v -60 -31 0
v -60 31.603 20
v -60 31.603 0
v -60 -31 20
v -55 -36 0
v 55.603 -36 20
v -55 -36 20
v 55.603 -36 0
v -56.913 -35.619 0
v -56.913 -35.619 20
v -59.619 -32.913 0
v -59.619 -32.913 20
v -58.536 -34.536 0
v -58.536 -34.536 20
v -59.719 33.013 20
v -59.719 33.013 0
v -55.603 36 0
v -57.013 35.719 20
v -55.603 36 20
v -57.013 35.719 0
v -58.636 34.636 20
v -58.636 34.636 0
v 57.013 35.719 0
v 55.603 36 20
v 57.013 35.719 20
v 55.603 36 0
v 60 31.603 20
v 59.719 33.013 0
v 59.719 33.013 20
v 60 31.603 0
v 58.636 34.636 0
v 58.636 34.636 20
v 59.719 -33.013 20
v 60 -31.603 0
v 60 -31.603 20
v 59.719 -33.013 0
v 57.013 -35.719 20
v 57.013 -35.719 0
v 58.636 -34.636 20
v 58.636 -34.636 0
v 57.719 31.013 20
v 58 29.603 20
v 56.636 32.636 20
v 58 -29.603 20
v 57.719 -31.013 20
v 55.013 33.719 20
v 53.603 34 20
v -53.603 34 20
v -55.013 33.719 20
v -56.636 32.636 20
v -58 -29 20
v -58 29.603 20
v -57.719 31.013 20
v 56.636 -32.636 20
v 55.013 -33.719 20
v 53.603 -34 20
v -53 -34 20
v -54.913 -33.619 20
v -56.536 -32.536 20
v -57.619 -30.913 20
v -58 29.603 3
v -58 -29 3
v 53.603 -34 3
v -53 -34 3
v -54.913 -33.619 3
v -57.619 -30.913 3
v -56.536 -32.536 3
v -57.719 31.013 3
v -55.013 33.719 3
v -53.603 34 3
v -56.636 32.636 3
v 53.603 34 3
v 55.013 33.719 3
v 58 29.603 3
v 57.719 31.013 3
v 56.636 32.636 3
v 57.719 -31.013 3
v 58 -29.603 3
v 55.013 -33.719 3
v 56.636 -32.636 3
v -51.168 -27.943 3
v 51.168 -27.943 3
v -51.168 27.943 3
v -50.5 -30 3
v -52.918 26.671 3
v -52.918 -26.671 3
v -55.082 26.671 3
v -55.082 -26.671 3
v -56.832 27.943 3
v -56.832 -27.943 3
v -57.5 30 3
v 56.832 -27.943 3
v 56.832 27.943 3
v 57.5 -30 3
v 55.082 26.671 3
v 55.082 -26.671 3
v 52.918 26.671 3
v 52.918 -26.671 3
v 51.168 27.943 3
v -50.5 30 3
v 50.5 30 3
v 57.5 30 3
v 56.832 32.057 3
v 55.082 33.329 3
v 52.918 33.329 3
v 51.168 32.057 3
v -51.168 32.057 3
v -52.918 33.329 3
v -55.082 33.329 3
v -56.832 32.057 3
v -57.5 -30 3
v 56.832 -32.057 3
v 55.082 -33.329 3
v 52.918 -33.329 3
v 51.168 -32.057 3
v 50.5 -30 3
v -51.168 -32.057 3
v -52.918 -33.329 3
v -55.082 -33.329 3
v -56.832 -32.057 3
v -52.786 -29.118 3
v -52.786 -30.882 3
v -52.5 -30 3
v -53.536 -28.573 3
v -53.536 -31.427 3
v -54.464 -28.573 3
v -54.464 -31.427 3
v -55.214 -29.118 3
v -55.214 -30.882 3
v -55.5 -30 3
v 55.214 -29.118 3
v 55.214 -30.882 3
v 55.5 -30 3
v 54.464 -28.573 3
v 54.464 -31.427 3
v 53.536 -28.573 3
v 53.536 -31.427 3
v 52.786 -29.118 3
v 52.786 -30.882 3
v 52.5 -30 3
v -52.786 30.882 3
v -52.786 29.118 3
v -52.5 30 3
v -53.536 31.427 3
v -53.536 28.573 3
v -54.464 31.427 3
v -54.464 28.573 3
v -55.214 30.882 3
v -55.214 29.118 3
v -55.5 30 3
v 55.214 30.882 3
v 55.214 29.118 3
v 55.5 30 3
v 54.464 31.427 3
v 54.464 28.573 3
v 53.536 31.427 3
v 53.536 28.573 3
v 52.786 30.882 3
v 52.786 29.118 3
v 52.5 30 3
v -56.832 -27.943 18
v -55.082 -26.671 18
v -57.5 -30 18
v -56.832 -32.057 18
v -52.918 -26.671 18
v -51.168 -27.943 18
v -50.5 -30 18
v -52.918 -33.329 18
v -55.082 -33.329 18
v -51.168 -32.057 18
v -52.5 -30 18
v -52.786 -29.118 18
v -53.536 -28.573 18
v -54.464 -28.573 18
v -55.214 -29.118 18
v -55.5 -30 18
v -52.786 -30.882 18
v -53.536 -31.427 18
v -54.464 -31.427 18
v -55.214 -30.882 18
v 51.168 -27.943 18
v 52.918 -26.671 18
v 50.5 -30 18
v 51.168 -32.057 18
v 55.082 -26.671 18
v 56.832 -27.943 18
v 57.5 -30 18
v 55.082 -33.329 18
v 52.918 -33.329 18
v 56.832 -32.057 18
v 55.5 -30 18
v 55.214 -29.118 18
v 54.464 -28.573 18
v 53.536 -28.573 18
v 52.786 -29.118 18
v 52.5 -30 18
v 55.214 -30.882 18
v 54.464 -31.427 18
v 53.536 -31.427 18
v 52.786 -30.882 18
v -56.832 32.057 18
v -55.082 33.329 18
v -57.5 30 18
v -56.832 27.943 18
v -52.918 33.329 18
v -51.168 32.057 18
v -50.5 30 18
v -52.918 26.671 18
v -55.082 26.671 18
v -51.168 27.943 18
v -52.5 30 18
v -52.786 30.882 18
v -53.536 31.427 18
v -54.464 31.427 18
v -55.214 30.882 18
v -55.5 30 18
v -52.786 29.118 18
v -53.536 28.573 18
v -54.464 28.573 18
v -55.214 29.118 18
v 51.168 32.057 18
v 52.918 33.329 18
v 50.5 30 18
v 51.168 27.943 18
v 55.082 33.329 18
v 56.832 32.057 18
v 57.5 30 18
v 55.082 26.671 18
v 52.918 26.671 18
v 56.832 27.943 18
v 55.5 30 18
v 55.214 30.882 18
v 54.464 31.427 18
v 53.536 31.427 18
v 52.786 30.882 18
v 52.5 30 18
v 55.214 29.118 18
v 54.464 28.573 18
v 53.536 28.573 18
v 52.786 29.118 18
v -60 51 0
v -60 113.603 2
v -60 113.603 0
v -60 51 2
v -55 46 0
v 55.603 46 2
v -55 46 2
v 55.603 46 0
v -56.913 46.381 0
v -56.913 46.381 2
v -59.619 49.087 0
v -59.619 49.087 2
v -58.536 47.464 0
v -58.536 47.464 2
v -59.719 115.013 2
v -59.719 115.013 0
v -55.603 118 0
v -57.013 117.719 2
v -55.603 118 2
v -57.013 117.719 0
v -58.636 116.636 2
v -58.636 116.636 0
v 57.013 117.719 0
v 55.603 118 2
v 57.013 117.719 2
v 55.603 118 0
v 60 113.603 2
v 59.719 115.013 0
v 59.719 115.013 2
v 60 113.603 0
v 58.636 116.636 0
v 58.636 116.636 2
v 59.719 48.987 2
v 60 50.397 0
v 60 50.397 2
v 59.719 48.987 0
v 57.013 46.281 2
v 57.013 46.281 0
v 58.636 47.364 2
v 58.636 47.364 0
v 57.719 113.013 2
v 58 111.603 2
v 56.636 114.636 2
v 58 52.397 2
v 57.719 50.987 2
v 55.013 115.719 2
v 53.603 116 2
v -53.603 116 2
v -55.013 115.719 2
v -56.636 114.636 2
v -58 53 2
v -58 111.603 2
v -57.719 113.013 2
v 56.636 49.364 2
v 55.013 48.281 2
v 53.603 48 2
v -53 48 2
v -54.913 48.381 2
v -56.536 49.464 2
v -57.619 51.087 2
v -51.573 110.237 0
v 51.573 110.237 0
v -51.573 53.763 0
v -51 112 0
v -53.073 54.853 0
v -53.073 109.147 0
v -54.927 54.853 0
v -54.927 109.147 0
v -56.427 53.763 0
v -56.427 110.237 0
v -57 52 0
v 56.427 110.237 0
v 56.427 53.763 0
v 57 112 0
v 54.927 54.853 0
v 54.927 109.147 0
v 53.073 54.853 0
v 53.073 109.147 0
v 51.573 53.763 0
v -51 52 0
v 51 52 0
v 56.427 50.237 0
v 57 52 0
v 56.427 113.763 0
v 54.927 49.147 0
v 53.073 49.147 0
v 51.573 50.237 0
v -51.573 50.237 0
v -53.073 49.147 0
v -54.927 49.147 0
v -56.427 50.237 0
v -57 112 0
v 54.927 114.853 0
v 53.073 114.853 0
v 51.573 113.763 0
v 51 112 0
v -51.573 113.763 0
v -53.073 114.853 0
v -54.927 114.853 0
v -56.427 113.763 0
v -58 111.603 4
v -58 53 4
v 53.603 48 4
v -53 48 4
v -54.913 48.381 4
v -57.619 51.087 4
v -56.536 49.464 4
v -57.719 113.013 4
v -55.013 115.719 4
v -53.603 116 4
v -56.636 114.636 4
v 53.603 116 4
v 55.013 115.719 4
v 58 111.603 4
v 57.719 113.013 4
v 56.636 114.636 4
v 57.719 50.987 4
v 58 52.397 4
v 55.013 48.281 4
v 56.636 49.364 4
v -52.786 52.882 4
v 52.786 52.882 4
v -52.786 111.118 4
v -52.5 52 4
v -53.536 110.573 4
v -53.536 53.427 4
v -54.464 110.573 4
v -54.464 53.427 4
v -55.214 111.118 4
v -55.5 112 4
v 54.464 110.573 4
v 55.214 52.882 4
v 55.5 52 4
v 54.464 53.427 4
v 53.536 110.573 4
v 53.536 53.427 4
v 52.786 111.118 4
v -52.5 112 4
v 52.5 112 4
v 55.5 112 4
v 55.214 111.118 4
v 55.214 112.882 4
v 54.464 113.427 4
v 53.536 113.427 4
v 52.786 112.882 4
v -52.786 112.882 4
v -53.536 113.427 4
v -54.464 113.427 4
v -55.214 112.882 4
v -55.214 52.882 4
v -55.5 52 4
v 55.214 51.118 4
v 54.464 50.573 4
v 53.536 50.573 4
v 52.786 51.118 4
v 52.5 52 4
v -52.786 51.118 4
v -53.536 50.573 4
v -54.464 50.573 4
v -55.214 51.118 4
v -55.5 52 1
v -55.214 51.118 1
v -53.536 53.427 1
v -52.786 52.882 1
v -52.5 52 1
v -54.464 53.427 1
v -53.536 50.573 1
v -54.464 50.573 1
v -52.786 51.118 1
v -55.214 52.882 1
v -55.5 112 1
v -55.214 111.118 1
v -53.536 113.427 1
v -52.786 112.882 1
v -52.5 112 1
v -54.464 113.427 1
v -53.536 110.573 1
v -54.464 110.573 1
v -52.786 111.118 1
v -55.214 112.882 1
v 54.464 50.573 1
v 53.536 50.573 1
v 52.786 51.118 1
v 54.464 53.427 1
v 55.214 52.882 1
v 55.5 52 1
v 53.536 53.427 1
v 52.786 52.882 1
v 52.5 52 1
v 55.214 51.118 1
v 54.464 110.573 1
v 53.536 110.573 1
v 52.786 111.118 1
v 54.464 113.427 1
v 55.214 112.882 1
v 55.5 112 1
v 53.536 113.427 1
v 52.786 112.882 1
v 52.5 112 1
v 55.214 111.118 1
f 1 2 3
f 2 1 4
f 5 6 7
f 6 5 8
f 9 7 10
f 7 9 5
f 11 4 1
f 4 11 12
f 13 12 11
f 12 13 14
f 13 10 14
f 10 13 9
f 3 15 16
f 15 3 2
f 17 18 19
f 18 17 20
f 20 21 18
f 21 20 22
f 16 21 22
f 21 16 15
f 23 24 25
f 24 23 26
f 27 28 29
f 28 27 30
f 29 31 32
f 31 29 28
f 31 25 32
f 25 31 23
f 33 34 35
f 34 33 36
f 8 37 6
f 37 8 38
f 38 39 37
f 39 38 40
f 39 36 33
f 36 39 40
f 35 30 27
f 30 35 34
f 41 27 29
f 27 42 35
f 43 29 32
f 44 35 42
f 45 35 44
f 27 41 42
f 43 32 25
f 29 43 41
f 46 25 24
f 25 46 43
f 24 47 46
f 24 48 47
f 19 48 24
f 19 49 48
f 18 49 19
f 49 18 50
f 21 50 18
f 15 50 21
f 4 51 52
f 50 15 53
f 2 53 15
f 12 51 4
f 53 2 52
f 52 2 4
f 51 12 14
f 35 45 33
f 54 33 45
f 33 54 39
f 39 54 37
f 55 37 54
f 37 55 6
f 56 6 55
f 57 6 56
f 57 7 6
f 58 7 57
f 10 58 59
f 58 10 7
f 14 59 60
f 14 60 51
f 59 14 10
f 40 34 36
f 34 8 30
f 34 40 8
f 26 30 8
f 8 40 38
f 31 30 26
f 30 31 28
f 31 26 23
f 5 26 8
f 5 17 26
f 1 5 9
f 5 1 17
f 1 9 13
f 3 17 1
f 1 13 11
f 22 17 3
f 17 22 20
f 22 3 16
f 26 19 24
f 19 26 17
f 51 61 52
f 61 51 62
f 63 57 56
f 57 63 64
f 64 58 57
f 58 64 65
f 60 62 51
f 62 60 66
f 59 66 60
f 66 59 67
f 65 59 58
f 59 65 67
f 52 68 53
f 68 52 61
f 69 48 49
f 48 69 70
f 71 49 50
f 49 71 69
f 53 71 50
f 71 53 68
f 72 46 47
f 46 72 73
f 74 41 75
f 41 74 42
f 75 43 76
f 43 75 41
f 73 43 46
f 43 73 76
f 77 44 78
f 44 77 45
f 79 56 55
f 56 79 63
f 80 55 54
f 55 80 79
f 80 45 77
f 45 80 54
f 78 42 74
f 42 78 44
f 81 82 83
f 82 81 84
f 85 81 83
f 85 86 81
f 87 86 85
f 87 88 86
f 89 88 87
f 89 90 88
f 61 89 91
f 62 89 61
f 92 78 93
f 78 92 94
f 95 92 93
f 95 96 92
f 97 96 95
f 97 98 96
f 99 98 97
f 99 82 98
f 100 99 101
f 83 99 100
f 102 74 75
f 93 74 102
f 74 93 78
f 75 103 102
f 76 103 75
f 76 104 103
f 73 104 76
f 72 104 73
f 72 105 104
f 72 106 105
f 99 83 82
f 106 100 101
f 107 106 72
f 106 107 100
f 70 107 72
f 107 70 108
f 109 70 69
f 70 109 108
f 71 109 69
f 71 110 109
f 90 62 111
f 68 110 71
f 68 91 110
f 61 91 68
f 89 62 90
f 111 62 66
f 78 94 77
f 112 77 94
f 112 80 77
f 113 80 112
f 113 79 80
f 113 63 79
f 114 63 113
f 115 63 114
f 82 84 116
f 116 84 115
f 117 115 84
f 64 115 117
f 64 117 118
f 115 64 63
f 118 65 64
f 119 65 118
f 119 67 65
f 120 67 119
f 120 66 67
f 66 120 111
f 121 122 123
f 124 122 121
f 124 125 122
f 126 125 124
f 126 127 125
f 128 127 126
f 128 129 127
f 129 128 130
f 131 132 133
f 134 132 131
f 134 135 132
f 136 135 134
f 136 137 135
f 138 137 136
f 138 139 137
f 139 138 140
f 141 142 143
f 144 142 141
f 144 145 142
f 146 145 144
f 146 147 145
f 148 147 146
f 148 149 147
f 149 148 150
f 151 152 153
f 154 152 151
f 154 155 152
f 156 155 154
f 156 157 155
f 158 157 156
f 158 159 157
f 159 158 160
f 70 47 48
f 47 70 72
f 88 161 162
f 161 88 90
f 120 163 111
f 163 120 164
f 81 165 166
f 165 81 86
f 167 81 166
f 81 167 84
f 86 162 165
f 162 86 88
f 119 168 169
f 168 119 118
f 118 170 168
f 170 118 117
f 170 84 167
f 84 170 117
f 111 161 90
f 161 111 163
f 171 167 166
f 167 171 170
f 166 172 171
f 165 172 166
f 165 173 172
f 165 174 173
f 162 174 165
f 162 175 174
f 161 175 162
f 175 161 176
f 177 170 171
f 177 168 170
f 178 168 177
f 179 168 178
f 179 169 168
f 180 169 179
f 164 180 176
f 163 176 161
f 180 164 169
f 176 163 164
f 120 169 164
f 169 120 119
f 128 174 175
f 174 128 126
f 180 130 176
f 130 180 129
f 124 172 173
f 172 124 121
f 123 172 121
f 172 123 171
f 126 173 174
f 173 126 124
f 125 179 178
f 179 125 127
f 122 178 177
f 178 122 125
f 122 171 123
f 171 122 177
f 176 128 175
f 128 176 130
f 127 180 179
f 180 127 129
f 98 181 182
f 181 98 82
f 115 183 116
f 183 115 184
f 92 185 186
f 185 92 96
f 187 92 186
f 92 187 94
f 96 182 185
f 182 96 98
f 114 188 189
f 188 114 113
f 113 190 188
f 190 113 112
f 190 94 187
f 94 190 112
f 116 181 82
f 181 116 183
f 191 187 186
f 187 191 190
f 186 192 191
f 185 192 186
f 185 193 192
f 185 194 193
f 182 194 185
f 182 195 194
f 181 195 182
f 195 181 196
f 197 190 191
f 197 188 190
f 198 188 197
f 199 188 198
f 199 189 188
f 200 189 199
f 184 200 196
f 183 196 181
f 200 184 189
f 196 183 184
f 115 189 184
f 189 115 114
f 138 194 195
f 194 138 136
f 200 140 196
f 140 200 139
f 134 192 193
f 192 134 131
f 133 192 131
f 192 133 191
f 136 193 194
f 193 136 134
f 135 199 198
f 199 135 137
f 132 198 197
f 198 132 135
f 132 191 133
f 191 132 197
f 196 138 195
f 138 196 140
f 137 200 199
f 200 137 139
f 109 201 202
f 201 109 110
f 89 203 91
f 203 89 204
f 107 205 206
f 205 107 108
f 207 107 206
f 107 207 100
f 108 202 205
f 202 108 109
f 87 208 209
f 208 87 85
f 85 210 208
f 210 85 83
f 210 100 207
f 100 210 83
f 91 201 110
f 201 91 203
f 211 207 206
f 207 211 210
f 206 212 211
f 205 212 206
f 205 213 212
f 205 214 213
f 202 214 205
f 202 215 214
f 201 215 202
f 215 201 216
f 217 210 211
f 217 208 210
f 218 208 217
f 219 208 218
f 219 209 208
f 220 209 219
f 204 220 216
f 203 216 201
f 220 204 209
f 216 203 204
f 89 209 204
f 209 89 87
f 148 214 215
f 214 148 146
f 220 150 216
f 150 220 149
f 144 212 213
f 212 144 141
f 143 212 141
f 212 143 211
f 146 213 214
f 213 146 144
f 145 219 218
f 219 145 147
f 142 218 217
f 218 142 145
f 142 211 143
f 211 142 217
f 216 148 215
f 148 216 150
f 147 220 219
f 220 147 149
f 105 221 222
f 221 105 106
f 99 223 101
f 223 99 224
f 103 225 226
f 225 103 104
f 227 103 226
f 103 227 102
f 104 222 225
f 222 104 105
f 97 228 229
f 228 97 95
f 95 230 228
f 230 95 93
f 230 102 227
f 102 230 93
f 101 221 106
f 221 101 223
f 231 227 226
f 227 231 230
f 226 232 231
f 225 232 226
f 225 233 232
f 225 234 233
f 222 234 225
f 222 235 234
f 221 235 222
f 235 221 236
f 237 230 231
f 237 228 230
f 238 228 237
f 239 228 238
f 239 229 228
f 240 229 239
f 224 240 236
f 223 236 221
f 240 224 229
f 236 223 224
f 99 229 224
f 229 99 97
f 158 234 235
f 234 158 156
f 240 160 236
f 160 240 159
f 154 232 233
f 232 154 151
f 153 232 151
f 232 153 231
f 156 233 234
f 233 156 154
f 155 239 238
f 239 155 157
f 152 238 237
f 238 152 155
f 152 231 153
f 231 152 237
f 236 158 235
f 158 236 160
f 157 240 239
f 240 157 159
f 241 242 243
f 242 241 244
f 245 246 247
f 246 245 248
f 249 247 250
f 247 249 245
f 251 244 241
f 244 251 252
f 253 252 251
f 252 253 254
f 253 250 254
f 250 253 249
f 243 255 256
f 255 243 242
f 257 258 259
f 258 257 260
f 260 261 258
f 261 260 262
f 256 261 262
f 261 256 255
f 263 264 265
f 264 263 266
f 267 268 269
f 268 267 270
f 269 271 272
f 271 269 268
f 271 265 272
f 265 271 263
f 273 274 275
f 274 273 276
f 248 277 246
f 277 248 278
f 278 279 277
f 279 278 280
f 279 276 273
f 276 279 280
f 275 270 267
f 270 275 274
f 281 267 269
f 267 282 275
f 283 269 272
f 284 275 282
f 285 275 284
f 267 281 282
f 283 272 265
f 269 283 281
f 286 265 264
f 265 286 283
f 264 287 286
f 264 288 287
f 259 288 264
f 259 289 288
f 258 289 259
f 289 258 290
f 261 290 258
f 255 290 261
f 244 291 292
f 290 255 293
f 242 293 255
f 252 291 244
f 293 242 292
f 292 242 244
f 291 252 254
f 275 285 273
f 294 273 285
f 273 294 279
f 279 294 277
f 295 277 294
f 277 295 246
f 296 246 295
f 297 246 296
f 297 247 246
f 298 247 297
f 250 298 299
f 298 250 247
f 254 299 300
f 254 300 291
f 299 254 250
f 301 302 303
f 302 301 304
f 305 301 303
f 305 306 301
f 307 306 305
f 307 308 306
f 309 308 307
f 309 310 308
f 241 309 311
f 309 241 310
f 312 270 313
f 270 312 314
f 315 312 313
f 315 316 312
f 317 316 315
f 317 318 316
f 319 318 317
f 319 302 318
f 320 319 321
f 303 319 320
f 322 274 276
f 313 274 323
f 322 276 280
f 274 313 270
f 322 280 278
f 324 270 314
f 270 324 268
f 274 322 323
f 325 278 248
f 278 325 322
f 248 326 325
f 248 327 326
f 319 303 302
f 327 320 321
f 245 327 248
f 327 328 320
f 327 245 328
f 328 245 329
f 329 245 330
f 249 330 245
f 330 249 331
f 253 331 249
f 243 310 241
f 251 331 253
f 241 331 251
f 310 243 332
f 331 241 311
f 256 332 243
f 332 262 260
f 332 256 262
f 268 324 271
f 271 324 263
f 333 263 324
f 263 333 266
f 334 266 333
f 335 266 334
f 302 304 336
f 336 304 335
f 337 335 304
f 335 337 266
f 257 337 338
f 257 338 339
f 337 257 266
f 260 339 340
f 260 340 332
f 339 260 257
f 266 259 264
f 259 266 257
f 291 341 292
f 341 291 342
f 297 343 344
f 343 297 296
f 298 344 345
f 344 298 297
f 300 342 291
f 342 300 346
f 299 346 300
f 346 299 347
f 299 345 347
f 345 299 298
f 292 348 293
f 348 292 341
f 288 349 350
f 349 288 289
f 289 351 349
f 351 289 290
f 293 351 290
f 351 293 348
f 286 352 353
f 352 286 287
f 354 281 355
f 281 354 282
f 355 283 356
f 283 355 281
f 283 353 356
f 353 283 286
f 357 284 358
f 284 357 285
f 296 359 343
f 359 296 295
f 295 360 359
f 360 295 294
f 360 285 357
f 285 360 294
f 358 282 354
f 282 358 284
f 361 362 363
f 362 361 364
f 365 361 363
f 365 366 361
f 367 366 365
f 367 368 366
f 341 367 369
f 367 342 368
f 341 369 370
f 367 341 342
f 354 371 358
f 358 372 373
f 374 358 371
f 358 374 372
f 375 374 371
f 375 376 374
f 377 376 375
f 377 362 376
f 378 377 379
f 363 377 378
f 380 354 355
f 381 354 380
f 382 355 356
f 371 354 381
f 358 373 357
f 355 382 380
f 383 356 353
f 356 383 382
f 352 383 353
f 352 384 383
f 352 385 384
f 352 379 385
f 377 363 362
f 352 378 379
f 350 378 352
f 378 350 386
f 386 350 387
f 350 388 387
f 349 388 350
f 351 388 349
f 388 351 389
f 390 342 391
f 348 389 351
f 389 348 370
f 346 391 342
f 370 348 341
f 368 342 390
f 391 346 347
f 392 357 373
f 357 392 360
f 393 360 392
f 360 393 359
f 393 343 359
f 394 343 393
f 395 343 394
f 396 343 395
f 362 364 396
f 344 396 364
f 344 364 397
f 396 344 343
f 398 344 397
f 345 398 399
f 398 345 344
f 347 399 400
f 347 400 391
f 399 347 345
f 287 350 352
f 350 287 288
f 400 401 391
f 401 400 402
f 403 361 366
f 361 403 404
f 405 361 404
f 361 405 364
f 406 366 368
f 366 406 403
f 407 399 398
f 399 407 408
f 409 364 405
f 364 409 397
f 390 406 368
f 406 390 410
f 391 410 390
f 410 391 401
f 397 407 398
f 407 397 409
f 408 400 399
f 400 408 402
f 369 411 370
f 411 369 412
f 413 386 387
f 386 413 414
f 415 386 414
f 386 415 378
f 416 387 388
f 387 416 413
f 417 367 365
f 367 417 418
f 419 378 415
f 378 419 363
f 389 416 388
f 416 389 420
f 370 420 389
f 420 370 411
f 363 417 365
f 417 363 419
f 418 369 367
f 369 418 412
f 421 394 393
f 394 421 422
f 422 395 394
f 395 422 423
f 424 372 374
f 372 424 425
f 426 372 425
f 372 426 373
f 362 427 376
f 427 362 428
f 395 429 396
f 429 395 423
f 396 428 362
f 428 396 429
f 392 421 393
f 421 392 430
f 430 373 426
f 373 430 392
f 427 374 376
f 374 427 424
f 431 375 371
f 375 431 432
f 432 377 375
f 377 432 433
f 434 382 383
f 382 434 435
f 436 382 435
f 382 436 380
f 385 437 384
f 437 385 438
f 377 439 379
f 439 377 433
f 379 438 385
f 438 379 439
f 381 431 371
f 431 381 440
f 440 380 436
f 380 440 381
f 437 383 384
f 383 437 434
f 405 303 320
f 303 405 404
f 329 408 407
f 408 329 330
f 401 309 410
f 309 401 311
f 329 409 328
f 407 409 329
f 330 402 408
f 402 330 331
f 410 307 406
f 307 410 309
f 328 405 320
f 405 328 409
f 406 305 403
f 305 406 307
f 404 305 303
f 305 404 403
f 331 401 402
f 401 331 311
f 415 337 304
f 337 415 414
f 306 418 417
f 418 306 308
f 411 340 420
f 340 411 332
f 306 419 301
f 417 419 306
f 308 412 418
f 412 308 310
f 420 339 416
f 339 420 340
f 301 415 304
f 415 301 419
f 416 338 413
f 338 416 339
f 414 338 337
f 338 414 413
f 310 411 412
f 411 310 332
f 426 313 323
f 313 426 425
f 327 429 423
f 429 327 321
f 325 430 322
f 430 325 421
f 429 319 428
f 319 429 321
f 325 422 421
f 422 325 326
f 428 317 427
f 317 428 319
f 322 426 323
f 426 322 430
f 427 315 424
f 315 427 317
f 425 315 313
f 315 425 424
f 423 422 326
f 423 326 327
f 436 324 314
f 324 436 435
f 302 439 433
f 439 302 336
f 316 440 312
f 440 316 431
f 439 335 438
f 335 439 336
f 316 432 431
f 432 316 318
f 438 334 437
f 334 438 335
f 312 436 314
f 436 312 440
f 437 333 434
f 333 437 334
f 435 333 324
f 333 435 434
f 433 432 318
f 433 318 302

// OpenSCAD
// 
// builds a solid rectangle with rounded corners (Z-only)
//

module screw_enc_block(width, height, depth, fillet_radius) {
    
    difference() {
        cube([width, height, depth], center = true);
        
        fudge = 0.1;
        fudge_depth = depth + 1.0;
        
        translate([-(width / 2), -(height / 2), -(fudge_depth / 2)])
        intersection () {
            cube([fillet_radius, fillet_radius, fudge_depth], center = false); 
            difference() {
                    cube([2 * fillet_radius, 2 * fillet_radius, fudge_depth], center = false); 
                    translate([fillet_radius, fillet_radius, 0.0])
                    cylinder(r = fillet_radius, h = fudge_depth);
            }
        }

        translate([-(width / 2 + fudge), (height / 2 + fudge), -(fudge_depth / 2)])
        rotate([0.0, 0.0, -90])
        intersection () {
            cube([fillet_radius, fillet_radius, fudge_depth], center = false); 
            difference() {
                    cube([2 * fillet_radius, 2 * fillet_radius, fudge_depth], center = false); 
                    translate([fillet_radius, fillet_radius, 0.0])
                    cylinder(r = fillet_radius, h = fudge_depth);
            }
        }

        translate([(width / 2 + fudge), (height / 2 + fudge), -(fudge_depth / 2)])
        rotate([0.0, 0.0, 180])
        intersection () {
            cube([fillet_radius, fillet_radius, fudge_depth], center = false); 
            difference() {
                    cube([2 * fillet_radius, 2 * fillet_radius, fudge_depth], center = false); 
                    translate([fillet_radius, fillet_radius, 0.0])
                    cylinder(r = fillet_radius, h = fudge_depth);
            }
        }

        translate([(width / 2 + fudge), -(height / 2 + fudge), -(fudge_depth / 2)])
        rotate([0.0, 0.0, 90])
        intersection () {
            cube([fillet_radius, fillet_radius, fudge_depth], center = false); 
            difference() {
                    cube([2 * fillet_radius, 2 * fillet_radius, fudge_depth], center = false); 
                    translate([fillet_radius, fillet_radius, 0.0])
                    cylinder(r = fillet_radius, h = fudge_depth);
            }
        }
    }
}

module screw_enc_enclosure(width, height, depth, fillet_radius, thickness, standoff_offset, standoff_radius, standoff_hole_radius) {
    union() {
    
        translate([0.0, 0.0, depth / 2.0])
        difference() {
            screw_enc_block(width, height, depth, fillet_radius);
            translate([0.0, 0.0, thickness]) 
                screw_enc_block(width - (2 * thickness), height - (2 * thickness), depth - thickness, fillet_radius);
        }
        
        translate([-((width / 2) - (thickness + standoff_radius + standoff_offset)), -((height / 2) - (thickness + standoff_radius + standoff_offset)), thickness ])
        difference() {
            cylinder(r = standoff_radius, h = (depth - (2 * thickness)), $fn=10);
            cylinder(r = standoff_hole_radius, h = (depth - (2 * thickness)), $fn=10);
        }
    
        translate([((width / 2) - (thickness + standoff_radius + standoff_offset)), -((height / 2) - (thickness + standoff_radius + standoff_offset)), thickness ])
        difference() {
            cylinder(r = standoff_radius, h = (depth - (2 * thickness)), $fn=10);
            cylinder(r = standoff_hole_radius, h = (depth - (2 * thickness)), $fn=10);
        }

        translate([-((width / 2) - (thickness + standoff_radius + standoff_offset)), ((height / 2) - (thickness + standoff_radius + standoff_offset)), thickness ])
        difference() {
            cylinder(r = standoff_radius, h = (depth - (2 * thickness)), $fn=10);
            cylinder(r = standoff_hole_radius, h = (depth - (2 * thickness)), $fn=10);
        }

        translate([((width / 2) - (thickness + standoff_radius + standoff_offset)), ((height / 2) - (thickness + standoff_radius + standoff_offset)), thickness ])
        difference() {
            cylinder(r = standoff_radius, h = (depth - (2 * thickness)), $fn=10);
            cylinder(r = standoff_hole_radius, h = (depth - (2 * thickness)), $fn=10);
        }
        
    }
}

module screw_enc_lid(width, height, fillet_radius, thickness, standoff_offset, standoff_radius, standoff_hole_radius) {
    difference() {
    
        lid_offset = 10.0;
        
        union() {
            translate([0.0, height + lid_offset, thickness / 2.0])
                screw_enc_block(width, height, thickness, fillet_radius);
            translate([0.0, height + lid_offset, thickness / 2.0 + thickness])
                screw_enc_block(width - (2 * thickness), height - (2 * thickness), thickness, fillet_radius);
        }
        
        hole_offset = height + lid_offset;
        
        // holes 
        translate([-((width / 2) - (thickness + standoff_radius + standoff_offset)), -((height / 2) - (thickness + standoff_radius + standoff_offset)) + hole_offset, 0.0])
        cylinder(r = standoff_hole_radius, h = (2 * thickness), $fn=10);
        
        translate([-((width / 2) - (thickness + standoff_radius + standoff_offset)), ((height / 2) - (thickness + standoff_radius + standoff_offset)) + hole_offset, 0.0])
        cylinder(r = standoff_hole_radius, h = (2 * thickness), $fn=10);

        translate([((width / 2) - (thickness + standoff_radius + standoff_offset)), -((height / 2) - (thickness + standoff_radius + standoff_offset)) + hole_offset, 0.0])
        cylinder(r = standoff_hole_radius, h = (2 * thickness), $fn=10);

        translate([((width / 2) - (thickness + standoff_radius + standoff_offset)), ((height / 2) - (thickness + standoff_radius + standoff_offset)) + hole_offset, 0.0])
        cylinder(r = standoff_hole_radius, h = (2 * thickness), $fn=10);
        
        // countersinks
        translate([-((width / 2) - (thickness + standoff_radius + standoff_offset)), -((height / 2) - (thickness + standoff_radius + standoff_offset)) + hole_offset, 0.0])
        cylinder(r1 = standoff_hole_radius * 2, r2 = 0.0, h = thickness, $fn=10);
        
        translate([-((width / 2) - (thickness + standoff_radius + standoff_offset)), ((height / 2) - (thickness + standoff_radius + standoff_offset)) + hole_offset, 0.0])
        cylinder(r1 = standoff_hole_radius * 2, r2 = 0.0, h = thickness, $fn=10);

        translate([((width / 2) - (thickness + standoff_radius + standoff_offset)), -((height / 2) - (thickness + standoff_radius + standoff_offset)) + hole_offset, 0.0])
        cylinder(r1 = standoff_hole_radius * 2, r2 = 0.0, h = thickness, $fn=10);

        translate([((width / 2) - (thickness + standoff_radius + standoff_offset)), ((height / 2) - (thickness + standoff_radius + standoff_offset)) + hole_offset, 0.0])
        cylinder(r1 = standoff_hole_radius * 2, r2 = 0.0, h = thickness, $fn=10);
                
    }
}


// Customized Enclosure
width = 120.0;       // Width of the enclosure
height = 72.0;       // Height of the enclosure
depth = 20.0;        // Depth of the enclosure
thickness = 2;       // Thickness of the walls and lid
fillet_radius = 5.0; // Amount of corner rounding
// Hidden
standoff_offset = 0.5;      // Position offset from the corner for the stand-offs
standoff_radius = 3.5;      // Radius of the stand-offs
standoff_hole_radius = 1.5; // Radius of the hole in the stand-offs


screw_enc_enclosure(width, height, depth, fillet_radius, thickness, standoff_offset, standoff_radius, standoff_hole_radius);
screw_enc_lid(width, height, fillet_radius, thickness, standoff_offset, standoff_radius, standoff_hole_radius);
